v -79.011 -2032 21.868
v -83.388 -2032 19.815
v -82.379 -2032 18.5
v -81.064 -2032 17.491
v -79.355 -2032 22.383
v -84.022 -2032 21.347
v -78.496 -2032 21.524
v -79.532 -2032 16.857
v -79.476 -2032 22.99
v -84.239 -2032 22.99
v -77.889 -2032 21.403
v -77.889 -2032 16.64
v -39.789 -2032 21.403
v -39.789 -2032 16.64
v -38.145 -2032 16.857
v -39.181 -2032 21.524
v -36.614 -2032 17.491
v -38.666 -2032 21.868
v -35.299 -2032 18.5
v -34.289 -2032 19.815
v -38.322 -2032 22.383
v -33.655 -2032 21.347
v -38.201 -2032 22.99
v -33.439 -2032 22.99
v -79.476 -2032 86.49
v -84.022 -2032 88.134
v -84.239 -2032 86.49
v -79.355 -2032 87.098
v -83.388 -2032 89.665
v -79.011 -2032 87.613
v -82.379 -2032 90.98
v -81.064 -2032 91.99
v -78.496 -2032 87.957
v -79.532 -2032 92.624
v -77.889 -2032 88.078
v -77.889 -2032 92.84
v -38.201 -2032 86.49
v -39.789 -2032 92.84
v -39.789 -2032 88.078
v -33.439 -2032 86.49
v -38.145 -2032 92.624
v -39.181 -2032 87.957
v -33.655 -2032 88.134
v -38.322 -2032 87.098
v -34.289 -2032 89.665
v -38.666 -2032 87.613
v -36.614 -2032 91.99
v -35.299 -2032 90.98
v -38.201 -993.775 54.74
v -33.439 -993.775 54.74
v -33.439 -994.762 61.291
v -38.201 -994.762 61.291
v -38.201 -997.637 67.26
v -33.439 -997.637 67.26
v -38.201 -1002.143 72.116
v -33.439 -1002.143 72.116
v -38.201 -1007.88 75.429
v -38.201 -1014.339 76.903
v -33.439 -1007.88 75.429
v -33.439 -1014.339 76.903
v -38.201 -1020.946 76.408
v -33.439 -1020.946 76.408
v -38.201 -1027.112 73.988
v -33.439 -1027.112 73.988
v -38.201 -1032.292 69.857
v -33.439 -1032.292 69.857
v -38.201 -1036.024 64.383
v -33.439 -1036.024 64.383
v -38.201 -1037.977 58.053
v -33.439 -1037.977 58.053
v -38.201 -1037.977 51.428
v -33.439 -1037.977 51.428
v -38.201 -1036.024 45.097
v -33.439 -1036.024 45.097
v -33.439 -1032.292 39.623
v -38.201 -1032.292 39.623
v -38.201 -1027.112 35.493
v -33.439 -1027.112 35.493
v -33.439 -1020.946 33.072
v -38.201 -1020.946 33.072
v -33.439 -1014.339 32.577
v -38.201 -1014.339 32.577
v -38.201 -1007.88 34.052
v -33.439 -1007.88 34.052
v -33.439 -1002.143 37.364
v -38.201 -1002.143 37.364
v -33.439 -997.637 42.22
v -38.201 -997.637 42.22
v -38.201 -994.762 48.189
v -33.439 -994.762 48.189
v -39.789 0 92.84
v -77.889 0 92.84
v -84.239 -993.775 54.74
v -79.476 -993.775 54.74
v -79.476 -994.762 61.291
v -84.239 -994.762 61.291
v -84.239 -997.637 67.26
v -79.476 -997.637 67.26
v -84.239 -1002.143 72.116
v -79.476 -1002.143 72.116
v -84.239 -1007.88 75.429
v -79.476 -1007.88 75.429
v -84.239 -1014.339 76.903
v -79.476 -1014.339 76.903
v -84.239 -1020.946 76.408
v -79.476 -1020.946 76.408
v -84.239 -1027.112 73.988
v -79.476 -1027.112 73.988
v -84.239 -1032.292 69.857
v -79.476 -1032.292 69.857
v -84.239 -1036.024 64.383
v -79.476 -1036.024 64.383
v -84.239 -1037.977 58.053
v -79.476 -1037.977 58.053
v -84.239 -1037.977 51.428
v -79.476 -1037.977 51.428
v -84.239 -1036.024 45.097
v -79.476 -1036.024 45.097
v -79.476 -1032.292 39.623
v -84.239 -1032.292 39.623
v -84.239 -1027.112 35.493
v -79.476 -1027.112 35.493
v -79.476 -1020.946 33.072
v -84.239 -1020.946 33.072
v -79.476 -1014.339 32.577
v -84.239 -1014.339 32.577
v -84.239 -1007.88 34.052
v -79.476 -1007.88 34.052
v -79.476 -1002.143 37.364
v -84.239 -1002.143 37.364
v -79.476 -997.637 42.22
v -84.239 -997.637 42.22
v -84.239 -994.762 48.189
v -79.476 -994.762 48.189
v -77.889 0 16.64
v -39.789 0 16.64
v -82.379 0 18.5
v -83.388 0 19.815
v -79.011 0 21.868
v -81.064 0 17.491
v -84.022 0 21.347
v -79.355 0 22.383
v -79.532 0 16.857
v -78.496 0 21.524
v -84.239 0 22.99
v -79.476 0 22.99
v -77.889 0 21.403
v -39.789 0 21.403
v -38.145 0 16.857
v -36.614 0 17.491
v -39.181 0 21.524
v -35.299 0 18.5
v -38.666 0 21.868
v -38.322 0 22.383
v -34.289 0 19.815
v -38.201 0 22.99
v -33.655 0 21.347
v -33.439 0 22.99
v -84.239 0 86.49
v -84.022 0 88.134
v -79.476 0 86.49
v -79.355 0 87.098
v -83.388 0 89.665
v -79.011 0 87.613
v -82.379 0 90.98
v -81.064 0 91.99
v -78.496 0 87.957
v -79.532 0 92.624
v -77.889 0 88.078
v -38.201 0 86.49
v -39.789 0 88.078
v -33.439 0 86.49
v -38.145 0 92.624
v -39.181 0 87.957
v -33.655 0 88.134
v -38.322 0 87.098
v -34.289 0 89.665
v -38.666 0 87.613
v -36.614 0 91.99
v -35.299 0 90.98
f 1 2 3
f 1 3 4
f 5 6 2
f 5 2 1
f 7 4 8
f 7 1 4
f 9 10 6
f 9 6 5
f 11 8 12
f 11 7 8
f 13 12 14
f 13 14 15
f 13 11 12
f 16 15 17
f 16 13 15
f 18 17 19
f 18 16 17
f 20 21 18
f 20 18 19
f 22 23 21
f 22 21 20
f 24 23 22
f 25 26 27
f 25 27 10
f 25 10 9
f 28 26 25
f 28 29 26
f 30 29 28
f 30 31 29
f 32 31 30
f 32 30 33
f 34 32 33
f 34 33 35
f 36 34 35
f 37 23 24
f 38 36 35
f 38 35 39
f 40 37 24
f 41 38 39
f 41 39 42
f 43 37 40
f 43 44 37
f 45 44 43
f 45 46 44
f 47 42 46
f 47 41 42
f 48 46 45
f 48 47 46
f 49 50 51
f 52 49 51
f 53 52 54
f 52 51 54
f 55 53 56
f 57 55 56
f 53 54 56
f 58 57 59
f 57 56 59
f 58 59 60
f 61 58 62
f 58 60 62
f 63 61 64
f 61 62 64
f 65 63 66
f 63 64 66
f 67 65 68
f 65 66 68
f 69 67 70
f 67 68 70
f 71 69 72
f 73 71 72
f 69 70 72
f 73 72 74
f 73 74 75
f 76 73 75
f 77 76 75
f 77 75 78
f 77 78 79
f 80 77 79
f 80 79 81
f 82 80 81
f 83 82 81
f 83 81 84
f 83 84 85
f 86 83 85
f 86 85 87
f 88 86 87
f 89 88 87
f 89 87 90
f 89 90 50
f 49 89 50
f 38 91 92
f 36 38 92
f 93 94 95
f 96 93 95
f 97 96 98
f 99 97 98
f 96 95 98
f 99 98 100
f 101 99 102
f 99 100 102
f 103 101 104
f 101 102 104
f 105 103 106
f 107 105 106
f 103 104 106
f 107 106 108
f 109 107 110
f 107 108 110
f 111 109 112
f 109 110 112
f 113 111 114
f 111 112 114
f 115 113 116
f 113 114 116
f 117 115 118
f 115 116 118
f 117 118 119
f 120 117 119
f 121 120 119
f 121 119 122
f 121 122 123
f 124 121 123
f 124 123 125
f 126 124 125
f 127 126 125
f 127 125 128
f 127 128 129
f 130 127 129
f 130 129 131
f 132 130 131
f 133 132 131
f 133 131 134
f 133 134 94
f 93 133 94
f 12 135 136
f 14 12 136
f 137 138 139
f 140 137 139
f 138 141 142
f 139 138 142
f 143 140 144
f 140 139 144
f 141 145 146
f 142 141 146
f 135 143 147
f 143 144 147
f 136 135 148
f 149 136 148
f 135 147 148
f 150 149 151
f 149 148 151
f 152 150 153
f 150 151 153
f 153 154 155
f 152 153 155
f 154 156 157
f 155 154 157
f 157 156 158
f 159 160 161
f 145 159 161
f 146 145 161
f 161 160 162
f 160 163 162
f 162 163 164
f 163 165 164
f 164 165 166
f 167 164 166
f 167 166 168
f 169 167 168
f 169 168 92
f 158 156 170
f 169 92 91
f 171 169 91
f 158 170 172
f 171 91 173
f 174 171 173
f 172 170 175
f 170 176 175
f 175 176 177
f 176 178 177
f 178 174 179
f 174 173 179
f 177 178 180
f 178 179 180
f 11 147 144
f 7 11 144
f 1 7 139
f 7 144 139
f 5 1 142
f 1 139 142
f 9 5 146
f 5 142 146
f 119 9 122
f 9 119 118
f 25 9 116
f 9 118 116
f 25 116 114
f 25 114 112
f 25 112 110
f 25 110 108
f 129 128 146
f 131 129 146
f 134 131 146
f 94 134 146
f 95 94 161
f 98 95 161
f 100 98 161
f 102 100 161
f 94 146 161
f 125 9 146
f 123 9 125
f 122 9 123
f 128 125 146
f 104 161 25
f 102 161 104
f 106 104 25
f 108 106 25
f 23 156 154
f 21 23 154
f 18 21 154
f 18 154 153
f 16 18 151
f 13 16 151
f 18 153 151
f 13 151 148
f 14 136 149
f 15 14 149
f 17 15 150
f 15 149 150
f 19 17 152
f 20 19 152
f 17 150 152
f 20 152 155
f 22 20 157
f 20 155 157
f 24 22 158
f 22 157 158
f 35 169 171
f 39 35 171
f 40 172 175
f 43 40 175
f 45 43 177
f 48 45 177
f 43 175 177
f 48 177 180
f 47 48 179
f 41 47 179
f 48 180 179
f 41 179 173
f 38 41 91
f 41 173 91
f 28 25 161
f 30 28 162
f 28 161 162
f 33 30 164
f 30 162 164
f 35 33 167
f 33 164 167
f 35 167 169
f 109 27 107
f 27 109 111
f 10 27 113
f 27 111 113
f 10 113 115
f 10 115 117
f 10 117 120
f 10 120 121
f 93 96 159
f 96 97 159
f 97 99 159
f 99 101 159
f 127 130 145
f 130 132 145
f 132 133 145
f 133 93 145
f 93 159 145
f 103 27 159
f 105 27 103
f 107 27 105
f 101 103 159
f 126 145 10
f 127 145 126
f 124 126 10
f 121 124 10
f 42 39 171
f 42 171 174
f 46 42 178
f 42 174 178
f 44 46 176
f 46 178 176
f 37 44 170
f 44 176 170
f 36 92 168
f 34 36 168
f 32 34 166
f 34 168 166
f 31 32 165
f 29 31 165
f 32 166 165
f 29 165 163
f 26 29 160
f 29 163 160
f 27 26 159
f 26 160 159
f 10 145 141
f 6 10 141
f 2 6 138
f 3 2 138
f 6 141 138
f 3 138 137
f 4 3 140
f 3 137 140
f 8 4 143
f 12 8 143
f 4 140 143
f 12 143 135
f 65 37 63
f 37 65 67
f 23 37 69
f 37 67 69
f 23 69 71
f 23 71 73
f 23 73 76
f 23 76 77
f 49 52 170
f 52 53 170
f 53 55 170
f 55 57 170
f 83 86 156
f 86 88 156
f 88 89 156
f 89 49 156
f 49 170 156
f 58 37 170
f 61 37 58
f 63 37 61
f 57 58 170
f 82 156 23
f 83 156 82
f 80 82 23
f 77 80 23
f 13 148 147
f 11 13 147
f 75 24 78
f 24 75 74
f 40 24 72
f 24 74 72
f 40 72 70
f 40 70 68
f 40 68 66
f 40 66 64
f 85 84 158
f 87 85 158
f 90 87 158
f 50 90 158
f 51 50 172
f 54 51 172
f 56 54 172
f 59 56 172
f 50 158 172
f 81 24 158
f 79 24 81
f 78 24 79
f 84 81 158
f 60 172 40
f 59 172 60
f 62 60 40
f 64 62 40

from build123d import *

# Parameters (mm, degrees)
F1_DEPTH = 2032
F2_R     = 22.225
F3_DEPTH = 50.801


with BuildPart() as f1:
    # F0 (on Front) → F1 (new body)
    with BuildSketch(Plane.XZ):
        with BuildLine():
            ThreePointArc((-84.238662, 22.99025), (-82.37879, 18.500122), (-77.888662, 16.64025))
            Line((-77.888662, 16.64025), (-39.788662, 16.64025))
            ThreePointArc((-39.788662, 16.64025), (-35.298534, 18.500122), (-33.438662, 22.99025))
            Line((-33.438662, 22.99025), (-33.438662, 86.49025))
            ThreePointArc((-33.438662, 86.49025), (-35.298534, 90.980378), (-39.788662, 92.84025))
            Line((-39.788662, 92.84025), (-77.888662, 92.84025))
            ThreePointArc((-77.888662, 92.84025), (-82.37879, 90.980378), (-84.238662, 86.49025))
            Line((-84.238662, 86.49025), (-84.238662, 22.99025))
        make_face()
        with BuildLine():
            ThreePointArc((-79.476162, 86.49025), (-79.011194, 87.612782), (-77.888662, 88.07775))
            Line((-77.888662, 88.07775), (-39.788662, 88.07775))
            ThreePointArc((-39.788662, 88.07775), (-38.66613, 87.612782), (-38.201162, 86.49025))
            Line((-38.201162, 86.49025), (-38.201162, 22.99025))
            ThreePointArc((-38.201162, 22.99025), (-38.66613, 21.867718), (-39.788662, 21.40275))
            Line((-39.788662, 21.40275), (-77.888662, 21.40275))
            ThreePointArc((-77.888662, 21.40275), (-79.011194, 21.867718), (-79.476162, 22.99025))
            Line((-79.476162, 22.99025), (-79.476162, 86.49025))
        make_face(mode=Mode.SUBTRACT)
    extrude(amount=F1_DEPTH)

    # F2 (on face) → F3 (cut, through all)
    with BuildSketch(Plane.YZ.offset(-33.438662)):
        with Locations((-1016, 54.74025)):
            Circle(F2_R)
    extrude(amount=-F3_DEPTH, mode=Mode.SUBTRACT)


solid = f1.part
